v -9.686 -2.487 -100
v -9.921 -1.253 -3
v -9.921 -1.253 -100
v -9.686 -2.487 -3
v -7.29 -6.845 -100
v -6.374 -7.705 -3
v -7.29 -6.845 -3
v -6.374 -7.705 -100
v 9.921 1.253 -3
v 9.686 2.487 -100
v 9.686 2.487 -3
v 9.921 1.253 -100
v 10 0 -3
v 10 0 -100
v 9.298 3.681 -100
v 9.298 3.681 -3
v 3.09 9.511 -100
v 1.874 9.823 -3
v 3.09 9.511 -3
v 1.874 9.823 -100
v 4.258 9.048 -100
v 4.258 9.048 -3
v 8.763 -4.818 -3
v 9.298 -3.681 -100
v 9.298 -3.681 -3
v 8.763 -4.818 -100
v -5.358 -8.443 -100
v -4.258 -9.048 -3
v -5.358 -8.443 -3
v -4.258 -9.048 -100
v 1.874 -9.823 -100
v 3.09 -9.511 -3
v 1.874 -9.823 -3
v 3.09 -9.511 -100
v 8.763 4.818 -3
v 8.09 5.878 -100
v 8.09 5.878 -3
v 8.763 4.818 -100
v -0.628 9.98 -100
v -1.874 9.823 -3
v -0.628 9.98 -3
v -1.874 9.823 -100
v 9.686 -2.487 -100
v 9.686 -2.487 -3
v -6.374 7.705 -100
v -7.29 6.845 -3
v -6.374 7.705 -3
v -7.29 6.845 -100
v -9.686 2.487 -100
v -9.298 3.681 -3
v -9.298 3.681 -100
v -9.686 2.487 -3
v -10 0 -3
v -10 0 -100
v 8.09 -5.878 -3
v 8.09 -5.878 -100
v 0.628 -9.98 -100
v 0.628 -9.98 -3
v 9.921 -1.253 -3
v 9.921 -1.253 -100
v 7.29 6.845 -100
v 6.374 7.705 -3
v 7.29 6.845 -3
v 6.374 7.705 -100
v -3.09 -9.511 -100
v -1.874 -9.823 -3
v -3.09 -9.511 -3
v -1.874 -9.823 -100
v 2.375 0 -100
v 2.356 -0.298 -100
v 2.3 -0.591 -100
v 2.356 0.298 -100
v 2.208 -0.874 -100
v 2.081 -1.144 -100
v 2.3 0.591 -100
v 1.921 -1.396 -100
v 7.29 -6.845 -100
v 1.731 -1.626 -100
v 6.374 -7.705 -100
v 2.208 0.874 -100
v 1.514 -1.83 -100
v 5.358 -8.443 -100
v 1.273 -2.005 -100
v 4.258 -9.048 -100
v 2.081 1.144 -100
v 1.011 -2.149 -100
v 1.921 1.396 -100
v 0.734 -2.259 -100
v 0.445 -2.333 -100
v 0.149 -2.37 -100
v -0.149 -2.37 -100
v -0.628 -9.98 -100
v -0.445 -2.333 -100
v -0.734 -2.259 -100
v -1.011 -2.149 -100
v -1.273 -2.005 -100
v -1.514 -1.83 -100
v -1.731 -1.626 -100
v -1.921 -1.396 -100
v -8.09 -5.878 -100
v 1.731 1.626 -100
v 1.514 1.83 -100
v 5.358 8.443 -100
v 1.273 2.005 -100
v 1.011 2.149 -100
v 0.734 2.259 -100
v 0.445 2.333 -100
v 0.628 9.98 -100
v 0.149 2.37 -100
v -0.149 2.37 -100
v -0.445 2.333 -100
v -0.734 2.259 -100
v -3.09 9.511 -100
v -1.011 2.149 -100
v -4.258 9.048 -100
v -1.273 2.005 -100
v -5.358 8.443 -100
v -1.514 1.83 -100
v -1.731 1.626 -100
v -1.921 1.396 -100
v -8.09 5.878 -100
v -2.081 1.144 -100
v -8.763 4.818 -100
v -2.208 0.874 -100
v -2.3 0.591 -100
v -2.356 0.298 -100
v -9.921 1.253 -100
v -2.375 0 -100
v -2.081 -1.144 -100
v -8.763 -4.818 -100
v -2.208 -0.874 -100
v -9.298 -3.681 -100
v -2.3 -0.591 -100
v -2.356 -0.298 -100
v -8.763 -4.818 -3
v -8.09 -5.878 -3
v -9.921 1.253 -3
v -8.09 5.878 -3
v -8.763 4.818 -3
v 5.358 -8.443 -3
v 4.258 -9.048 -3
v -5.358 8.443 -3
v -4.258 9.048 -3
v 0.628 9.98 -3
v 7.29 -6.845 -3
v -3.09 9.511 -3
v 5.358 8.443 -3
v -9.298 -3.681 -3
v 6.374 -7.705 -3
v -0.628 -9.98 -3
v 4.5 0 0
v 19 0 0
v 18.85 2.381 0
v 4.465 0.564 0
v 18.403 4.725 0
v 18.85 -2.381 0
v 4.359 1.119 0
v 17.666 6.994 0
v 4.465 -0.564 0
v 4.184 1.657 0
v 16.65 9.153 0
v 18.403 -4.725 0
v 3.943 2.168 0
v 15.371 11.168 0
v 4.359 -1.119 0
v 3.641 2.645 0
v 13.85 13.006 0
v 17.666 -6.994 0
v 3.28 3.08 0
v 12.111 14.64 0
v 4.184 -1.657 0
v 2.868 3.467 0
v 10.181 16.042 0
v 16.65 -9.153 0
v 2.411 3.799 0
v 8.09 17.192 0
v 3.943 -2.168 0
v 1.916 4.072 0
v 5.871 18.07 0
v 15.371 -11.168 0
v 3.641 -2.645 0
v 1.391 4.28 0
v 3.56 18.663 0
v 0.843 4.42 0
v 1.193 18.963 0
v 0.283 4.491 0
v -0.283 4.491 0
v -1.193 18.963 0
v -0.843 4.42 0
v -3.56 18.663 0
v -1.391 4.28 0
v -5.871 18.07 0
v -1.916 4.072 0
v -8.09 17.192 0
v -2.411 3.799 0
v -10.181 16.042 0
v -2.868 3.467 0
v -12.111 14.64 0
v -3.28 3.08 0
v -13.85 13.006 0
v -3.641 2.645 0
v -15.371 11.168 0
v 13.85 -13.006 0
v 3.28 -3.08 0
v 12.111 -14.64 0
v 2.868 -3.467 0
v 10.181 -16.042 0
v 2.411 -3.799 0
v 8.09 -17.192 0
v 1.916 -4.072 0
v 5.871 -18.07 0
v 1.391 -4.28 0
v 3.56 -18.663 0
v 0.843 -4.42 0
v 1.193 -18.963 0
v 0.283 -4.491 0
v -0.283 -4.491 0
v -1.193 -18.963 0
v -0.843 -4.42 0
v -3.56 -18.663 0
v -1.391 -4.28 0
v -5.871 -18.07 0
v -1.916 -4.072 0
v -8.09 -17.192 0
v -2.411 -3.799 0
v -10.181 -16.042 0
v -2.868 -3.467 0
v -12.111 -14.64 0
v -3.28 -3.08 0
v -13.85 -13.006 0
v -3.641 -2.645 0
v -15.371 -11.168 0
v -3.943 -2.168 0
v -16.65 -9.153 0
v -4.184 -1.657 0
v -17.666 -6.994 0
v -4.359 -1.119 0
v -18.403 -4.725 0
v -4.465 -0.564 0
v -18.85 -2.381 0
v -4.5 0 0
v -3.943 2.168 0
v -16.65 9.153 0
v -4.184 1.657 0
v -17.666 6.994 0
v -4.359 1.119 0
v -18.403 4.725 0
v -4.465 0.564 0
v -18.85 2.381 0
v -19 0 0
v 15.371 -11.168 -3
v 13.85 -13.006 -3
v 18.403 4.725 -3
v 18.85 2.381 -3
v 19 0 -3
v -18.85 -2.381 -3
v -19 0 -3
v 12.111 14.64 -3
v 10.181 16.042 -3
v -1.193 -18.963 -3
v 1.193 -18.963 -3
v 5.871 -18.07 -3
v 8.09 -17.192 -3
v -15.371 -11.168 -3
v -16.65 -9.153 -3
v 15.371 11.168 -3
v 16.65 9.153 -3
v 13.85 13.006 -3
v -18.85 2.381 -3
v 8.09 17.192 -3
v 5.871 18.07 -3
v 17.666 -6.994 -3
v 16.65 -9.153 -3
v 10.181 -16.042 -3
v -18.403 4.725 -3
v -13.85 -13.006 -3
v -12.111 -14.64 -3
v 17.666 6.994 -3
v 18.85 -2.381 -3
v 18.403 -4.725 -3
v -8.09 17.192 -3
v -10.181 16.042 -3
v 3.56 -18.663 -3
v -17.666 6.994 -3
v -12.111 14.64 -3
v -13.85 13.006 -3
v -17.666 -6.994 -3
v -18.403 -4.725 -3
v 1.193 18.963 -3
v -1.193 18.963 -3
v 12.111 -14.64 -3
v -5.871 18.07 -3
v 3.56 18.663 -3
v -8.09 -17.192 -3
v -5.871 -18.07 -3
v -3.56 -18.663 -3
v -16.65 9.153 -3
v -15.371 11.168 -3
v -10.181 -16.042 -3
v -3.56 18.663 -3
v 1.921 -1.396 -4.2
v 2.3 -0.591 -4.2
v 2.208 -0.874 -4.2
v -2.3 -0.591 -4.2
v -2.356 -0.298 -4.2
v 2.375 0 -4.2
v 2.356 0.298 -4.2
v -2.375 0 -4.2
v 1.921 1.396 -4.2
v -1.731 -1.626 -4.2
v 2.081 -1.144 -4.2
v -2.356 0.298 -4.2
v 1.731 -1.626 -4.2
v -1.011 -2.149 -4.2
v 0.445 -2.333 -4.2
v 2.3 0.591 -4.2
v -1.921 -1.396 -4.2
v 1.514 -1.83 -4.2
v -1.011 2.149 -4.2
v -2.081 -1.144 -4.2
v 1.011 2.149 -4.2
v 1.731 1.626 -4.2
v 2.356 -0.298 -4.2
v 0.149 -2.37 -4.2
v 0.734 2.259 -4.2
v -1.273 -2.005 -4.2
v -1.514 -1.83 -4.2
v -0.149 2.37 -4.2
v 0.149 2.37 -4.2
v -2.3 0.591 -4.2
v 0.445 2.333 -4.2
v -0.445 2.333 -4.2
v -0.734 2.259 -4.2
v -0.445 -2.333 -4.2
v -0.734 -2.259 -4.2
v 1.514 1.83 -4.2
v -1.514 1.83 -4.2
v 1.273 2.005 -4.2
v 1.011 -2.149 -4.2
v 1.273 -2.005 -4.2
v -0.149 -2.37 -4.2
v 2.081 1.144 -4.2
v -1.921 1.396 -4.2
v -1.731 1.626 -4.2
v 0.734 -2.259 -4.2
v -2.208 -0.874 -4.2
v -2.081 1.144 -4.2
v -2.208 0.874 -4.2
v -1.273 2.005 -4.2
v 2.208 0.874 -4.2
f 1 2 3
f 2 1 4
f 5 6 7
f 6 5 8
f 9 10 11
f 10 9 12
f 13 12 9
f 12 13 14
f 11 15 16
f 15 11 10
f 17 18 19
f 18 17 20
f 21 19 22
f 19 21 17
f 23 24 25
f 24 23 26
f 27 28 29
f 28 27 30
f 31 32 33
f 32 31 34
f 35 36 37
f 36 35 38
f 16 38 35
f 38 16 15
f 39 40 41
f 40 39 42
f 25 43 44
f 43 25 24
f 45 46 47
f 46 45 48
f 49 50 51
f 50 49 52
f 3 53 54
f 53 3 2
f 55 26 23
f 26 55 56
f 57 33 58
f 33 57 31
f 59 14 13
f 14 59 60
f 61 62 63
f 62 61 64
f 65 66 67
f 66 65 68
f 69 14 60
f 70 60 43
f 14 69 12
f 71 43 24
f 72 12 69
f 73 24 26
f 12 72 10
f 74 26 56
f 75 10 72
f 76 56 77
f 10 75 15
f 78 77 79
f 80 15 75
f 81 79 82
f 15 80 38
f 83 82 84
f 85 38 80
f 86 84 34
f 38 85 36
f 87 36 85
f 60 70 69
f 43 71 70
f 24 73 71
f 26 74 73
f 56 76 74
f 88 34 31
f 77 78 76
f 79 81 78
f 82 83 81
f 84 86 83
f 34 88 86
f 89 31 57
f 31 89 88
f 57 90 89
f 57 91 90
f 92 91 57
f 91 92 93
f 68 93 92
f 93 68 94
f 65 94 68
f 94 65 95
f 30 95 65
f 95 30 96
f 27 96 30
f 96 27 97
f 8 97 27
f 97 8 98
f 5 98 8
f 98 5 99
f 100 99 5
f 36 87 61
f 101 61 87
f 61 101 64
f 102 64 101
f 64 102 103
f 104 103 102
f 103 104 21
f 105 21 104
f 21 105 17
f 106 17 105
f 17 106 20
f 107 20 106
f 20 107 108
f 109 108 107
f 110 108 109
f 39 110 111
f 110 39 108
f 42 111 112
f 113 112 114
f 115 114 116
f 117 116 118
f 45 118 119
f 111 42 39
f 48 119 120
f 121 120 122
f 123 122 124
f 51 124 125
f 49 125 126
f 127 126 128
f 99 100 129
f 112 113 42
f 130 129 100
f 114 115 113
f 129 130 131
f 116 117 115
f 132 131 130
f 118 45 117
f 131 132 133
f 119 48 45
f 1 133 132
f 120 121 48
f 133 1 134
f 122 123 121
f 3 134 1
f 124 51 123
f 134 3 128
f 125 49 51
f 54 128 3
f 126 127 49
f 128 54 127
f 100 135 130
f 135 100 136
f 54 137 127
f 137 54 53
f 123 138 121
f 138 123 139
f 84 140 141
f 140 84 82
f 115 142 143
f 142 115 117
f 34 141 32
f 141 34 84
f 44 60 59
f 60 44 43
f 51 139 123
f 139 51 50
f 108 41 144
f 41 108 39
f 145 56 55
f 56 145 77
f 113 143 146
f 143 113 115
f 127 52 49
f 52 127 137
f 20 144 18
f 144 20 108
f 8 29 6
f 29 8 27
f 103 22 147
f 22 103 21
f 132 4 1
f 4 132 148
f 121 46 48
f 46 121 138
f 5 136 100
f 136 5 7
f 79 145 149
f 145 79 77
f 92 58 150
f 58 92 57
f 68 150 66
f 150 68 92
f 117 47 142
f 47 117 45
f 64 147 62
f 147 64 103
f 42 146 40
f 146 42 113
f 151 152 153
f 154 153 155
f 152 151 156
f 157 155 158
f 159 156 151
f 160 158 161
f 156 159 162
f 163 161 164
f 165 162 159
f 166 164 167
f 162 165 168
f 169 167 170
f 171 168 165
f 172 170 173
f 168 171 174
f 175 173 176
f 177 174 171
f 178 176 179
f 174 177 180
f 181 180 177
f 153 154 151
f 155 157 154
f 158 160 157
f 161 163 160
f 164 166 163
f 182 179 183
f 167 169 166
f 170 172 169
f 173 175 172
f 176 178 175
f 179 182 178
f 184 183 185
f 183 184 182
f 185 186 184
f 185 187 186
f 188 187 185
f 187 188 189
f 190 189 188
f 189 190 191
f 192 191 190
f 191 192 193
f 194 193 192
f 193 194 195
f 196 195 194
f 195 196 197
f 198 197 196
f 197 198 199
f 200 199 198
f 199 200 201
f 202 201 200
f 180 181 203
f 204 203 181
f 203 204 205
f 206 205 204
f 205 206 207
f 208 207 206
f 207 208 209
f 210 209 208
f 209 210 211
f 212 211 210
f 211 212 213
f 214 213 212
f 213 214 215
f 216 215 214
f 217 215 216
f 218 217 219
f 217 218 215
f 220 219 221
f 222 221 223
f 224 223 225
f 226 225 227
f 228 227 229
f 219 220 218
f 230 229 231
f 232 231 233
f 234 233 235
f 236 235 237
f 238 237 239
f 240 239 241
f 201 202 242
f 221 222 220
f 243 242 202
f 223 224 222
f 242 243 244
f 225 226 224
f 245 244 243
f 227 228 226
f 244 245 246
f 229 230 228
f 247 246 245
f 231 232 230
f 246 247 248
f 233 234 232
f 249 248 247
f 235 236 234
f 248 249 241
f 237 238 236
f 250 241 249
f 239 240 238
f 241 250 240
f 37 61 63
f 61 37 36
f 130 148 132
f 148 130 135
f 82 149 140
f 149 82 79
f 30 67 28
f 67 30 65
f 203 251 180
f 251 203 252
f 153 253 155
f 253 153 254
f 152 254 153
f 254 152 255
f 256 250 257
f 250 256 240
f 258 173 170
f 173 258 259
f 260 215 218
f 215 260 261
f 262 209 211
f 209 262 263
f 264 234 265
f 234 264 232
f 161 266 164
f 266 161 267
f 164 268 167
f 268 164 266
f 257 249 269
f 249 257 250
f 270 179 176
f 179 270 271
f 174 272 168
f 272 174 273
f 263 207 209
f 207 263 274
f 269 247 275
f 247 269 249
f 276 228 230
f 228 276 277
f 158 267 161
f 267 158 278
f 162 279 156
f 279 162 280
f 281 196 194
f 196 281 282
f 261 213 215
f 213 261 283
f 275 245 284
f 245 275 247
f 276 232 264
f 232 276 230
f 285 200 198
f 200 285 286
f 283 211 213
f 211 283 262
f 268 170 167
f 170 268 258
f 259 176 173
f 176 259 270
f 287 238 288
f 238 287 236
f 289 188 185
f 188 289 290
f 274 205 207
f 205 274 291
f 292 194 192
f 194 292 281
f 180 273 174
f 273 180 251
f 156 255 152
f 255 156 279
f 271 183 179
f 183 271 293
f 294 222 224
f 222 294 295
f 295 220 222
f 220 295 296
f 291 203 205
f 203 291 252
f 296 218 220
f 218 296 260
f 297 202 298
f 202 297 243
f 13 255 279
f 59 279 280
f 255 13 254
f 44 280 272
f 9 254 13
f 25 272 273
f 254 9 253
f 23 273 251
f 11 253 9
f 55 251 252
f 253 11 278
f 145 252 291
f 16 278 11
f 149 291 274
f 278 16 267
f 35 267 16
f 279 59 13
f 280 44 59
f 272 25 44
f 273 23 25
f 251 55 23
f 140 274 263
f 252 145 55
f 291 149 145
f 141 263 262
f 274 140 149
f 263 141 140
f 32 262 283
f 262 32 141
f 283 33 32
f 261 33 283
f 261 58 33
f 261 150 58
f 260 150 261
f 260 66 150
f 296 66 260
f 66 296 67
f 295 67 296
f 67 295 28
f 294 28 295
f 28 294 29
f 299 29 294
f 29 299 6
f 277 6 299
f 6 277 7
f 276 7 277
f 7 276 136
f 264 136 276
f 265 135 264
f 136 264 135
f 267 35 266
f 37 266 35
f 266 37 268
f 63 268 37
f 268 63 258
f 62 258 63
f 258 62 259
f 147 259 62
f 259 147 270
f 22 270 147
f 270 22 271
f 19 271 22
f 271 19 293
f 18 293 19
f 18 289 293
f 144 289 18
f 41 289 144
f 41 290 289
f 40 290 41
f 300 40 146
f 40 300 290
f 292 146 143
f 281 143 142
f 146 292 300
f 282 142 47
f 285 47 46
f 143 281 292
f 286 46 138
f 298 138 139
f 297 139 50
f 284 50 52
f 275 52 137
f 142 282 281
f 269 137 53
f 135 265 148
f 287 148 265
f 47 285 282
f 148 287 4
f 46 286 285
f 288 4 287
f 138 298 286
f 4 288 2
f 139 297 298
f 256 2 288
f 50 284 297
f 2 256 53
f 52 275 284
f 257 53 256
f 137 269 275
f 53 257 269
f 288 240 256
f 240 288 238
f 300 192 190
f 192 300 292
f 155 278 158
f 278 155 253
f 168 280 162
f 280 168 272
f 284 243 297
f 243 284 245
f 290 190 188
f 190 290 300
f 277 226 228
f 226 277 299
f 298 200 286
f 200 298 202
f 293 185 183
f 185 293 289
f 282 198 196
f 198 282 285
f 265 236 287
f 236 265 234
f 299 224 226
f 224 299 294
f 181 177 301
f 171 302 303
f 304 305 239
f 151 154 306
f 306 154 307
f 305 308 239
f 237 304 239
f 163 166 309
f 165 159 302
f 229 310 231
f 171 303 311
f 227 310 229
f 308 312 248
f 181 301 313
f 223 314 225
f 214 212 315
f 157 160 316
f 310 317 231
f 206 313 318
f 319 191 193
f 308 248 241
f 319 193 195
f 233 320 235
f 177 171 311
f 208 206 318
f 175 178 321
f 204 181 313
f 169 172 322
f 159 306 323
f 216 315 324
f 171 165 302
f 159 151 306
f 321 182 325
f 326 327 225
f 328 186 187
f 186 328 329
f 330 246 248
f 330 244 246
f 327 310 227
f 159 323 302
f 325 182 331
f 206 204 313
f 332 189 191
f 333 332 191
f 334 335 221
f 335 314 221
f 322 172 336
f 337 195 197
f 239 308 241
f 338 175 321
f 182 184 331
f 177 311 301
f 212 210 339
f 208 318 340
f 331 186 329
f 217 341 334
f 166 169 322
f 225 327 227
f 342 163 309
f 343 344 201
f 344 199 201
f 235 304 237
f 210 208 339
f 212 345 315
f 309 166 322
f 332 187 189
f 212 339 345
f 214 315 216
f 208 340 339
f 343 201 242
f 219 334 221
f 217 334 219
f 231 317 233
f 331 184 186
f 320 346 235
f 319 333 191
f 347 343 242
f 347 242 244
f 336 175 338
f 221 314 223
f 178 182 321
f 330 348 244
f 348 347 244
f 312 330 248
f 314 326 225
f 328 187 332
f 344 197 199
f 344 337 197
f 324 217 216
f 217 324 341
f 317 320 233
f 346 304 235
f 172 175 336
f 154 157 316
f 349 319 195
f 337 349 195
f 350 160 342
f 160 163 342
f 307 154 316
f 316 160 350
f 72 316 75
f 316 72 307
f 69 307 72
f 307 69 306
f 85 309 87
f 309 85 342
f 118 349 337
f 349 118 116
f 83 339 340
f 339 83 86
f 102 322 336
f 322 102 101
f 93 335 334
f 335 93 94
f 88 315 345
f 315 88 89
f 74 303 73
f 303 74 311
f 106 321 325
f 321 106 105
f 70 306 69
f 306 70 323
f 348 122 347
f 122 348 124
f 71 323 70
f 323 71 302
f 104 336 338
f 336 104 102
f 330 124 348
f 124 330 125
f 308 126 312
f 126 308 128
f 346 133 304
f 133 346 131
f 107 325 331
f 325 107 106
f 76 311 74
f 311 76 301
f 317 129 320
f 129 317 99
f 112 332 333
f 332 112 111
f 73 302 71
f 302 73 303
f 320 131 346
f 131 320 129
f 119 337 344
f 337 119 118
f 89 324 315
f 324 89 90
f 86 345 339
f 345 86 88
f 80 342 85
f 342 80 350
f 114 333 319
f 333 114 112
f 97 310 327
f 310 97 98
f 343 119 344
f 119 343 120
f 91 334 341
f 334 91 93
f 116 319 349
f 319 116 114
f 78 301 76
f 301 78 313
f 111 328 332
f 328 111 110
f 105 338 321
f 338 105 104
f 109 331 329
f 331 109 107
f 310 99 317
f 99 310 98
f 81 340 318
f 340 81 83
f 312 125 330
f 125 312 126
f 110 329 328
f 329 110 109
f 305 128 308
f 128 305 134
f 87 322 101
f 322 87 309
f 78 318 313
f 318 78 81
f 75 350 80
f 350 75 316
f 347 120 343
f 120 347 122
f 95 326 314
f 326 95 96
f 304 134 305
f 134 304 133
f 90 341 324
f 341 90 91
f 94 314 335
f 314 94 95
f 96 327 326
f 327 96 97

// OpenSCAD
$fn = 50;


difference() {
	union() {
		translate(v = [0, 0, -100.0000000000]) {
			cylinder(h = 100, r = 10.0000000000);
		}
		translate(v = [0, 0, -3.0000000000]) {
			cylinder(h = 3, r = 19.0000000000);
		}
	}
	union() {
		translate(v = [0, 0, 0]) {
			rotate(a = [0, 0, 0]) {
				difference() {
					union() {
						#translate(v = [0, 0, -100.0000000000]) {
							cylinder(h = 100, r = 2.2500000000);
						}
						#translate(v = [0, 0, -4.2000000000]) {
							cylinder(h = 4.2000000000, r1 = 2.3750000000, r2 = 4.5000000000);
						}
						#translate(v = [0, 0, -100.0000000000]) {
							cylinder(h = 100, r = 2.3750000000);
						}
						#translate(v = [0, 0, -100.0000000000]) {
							cylinder(h = 100, r = 2.2500000000);
						}
					}
					union();
				}
			}
		}
	}
}
